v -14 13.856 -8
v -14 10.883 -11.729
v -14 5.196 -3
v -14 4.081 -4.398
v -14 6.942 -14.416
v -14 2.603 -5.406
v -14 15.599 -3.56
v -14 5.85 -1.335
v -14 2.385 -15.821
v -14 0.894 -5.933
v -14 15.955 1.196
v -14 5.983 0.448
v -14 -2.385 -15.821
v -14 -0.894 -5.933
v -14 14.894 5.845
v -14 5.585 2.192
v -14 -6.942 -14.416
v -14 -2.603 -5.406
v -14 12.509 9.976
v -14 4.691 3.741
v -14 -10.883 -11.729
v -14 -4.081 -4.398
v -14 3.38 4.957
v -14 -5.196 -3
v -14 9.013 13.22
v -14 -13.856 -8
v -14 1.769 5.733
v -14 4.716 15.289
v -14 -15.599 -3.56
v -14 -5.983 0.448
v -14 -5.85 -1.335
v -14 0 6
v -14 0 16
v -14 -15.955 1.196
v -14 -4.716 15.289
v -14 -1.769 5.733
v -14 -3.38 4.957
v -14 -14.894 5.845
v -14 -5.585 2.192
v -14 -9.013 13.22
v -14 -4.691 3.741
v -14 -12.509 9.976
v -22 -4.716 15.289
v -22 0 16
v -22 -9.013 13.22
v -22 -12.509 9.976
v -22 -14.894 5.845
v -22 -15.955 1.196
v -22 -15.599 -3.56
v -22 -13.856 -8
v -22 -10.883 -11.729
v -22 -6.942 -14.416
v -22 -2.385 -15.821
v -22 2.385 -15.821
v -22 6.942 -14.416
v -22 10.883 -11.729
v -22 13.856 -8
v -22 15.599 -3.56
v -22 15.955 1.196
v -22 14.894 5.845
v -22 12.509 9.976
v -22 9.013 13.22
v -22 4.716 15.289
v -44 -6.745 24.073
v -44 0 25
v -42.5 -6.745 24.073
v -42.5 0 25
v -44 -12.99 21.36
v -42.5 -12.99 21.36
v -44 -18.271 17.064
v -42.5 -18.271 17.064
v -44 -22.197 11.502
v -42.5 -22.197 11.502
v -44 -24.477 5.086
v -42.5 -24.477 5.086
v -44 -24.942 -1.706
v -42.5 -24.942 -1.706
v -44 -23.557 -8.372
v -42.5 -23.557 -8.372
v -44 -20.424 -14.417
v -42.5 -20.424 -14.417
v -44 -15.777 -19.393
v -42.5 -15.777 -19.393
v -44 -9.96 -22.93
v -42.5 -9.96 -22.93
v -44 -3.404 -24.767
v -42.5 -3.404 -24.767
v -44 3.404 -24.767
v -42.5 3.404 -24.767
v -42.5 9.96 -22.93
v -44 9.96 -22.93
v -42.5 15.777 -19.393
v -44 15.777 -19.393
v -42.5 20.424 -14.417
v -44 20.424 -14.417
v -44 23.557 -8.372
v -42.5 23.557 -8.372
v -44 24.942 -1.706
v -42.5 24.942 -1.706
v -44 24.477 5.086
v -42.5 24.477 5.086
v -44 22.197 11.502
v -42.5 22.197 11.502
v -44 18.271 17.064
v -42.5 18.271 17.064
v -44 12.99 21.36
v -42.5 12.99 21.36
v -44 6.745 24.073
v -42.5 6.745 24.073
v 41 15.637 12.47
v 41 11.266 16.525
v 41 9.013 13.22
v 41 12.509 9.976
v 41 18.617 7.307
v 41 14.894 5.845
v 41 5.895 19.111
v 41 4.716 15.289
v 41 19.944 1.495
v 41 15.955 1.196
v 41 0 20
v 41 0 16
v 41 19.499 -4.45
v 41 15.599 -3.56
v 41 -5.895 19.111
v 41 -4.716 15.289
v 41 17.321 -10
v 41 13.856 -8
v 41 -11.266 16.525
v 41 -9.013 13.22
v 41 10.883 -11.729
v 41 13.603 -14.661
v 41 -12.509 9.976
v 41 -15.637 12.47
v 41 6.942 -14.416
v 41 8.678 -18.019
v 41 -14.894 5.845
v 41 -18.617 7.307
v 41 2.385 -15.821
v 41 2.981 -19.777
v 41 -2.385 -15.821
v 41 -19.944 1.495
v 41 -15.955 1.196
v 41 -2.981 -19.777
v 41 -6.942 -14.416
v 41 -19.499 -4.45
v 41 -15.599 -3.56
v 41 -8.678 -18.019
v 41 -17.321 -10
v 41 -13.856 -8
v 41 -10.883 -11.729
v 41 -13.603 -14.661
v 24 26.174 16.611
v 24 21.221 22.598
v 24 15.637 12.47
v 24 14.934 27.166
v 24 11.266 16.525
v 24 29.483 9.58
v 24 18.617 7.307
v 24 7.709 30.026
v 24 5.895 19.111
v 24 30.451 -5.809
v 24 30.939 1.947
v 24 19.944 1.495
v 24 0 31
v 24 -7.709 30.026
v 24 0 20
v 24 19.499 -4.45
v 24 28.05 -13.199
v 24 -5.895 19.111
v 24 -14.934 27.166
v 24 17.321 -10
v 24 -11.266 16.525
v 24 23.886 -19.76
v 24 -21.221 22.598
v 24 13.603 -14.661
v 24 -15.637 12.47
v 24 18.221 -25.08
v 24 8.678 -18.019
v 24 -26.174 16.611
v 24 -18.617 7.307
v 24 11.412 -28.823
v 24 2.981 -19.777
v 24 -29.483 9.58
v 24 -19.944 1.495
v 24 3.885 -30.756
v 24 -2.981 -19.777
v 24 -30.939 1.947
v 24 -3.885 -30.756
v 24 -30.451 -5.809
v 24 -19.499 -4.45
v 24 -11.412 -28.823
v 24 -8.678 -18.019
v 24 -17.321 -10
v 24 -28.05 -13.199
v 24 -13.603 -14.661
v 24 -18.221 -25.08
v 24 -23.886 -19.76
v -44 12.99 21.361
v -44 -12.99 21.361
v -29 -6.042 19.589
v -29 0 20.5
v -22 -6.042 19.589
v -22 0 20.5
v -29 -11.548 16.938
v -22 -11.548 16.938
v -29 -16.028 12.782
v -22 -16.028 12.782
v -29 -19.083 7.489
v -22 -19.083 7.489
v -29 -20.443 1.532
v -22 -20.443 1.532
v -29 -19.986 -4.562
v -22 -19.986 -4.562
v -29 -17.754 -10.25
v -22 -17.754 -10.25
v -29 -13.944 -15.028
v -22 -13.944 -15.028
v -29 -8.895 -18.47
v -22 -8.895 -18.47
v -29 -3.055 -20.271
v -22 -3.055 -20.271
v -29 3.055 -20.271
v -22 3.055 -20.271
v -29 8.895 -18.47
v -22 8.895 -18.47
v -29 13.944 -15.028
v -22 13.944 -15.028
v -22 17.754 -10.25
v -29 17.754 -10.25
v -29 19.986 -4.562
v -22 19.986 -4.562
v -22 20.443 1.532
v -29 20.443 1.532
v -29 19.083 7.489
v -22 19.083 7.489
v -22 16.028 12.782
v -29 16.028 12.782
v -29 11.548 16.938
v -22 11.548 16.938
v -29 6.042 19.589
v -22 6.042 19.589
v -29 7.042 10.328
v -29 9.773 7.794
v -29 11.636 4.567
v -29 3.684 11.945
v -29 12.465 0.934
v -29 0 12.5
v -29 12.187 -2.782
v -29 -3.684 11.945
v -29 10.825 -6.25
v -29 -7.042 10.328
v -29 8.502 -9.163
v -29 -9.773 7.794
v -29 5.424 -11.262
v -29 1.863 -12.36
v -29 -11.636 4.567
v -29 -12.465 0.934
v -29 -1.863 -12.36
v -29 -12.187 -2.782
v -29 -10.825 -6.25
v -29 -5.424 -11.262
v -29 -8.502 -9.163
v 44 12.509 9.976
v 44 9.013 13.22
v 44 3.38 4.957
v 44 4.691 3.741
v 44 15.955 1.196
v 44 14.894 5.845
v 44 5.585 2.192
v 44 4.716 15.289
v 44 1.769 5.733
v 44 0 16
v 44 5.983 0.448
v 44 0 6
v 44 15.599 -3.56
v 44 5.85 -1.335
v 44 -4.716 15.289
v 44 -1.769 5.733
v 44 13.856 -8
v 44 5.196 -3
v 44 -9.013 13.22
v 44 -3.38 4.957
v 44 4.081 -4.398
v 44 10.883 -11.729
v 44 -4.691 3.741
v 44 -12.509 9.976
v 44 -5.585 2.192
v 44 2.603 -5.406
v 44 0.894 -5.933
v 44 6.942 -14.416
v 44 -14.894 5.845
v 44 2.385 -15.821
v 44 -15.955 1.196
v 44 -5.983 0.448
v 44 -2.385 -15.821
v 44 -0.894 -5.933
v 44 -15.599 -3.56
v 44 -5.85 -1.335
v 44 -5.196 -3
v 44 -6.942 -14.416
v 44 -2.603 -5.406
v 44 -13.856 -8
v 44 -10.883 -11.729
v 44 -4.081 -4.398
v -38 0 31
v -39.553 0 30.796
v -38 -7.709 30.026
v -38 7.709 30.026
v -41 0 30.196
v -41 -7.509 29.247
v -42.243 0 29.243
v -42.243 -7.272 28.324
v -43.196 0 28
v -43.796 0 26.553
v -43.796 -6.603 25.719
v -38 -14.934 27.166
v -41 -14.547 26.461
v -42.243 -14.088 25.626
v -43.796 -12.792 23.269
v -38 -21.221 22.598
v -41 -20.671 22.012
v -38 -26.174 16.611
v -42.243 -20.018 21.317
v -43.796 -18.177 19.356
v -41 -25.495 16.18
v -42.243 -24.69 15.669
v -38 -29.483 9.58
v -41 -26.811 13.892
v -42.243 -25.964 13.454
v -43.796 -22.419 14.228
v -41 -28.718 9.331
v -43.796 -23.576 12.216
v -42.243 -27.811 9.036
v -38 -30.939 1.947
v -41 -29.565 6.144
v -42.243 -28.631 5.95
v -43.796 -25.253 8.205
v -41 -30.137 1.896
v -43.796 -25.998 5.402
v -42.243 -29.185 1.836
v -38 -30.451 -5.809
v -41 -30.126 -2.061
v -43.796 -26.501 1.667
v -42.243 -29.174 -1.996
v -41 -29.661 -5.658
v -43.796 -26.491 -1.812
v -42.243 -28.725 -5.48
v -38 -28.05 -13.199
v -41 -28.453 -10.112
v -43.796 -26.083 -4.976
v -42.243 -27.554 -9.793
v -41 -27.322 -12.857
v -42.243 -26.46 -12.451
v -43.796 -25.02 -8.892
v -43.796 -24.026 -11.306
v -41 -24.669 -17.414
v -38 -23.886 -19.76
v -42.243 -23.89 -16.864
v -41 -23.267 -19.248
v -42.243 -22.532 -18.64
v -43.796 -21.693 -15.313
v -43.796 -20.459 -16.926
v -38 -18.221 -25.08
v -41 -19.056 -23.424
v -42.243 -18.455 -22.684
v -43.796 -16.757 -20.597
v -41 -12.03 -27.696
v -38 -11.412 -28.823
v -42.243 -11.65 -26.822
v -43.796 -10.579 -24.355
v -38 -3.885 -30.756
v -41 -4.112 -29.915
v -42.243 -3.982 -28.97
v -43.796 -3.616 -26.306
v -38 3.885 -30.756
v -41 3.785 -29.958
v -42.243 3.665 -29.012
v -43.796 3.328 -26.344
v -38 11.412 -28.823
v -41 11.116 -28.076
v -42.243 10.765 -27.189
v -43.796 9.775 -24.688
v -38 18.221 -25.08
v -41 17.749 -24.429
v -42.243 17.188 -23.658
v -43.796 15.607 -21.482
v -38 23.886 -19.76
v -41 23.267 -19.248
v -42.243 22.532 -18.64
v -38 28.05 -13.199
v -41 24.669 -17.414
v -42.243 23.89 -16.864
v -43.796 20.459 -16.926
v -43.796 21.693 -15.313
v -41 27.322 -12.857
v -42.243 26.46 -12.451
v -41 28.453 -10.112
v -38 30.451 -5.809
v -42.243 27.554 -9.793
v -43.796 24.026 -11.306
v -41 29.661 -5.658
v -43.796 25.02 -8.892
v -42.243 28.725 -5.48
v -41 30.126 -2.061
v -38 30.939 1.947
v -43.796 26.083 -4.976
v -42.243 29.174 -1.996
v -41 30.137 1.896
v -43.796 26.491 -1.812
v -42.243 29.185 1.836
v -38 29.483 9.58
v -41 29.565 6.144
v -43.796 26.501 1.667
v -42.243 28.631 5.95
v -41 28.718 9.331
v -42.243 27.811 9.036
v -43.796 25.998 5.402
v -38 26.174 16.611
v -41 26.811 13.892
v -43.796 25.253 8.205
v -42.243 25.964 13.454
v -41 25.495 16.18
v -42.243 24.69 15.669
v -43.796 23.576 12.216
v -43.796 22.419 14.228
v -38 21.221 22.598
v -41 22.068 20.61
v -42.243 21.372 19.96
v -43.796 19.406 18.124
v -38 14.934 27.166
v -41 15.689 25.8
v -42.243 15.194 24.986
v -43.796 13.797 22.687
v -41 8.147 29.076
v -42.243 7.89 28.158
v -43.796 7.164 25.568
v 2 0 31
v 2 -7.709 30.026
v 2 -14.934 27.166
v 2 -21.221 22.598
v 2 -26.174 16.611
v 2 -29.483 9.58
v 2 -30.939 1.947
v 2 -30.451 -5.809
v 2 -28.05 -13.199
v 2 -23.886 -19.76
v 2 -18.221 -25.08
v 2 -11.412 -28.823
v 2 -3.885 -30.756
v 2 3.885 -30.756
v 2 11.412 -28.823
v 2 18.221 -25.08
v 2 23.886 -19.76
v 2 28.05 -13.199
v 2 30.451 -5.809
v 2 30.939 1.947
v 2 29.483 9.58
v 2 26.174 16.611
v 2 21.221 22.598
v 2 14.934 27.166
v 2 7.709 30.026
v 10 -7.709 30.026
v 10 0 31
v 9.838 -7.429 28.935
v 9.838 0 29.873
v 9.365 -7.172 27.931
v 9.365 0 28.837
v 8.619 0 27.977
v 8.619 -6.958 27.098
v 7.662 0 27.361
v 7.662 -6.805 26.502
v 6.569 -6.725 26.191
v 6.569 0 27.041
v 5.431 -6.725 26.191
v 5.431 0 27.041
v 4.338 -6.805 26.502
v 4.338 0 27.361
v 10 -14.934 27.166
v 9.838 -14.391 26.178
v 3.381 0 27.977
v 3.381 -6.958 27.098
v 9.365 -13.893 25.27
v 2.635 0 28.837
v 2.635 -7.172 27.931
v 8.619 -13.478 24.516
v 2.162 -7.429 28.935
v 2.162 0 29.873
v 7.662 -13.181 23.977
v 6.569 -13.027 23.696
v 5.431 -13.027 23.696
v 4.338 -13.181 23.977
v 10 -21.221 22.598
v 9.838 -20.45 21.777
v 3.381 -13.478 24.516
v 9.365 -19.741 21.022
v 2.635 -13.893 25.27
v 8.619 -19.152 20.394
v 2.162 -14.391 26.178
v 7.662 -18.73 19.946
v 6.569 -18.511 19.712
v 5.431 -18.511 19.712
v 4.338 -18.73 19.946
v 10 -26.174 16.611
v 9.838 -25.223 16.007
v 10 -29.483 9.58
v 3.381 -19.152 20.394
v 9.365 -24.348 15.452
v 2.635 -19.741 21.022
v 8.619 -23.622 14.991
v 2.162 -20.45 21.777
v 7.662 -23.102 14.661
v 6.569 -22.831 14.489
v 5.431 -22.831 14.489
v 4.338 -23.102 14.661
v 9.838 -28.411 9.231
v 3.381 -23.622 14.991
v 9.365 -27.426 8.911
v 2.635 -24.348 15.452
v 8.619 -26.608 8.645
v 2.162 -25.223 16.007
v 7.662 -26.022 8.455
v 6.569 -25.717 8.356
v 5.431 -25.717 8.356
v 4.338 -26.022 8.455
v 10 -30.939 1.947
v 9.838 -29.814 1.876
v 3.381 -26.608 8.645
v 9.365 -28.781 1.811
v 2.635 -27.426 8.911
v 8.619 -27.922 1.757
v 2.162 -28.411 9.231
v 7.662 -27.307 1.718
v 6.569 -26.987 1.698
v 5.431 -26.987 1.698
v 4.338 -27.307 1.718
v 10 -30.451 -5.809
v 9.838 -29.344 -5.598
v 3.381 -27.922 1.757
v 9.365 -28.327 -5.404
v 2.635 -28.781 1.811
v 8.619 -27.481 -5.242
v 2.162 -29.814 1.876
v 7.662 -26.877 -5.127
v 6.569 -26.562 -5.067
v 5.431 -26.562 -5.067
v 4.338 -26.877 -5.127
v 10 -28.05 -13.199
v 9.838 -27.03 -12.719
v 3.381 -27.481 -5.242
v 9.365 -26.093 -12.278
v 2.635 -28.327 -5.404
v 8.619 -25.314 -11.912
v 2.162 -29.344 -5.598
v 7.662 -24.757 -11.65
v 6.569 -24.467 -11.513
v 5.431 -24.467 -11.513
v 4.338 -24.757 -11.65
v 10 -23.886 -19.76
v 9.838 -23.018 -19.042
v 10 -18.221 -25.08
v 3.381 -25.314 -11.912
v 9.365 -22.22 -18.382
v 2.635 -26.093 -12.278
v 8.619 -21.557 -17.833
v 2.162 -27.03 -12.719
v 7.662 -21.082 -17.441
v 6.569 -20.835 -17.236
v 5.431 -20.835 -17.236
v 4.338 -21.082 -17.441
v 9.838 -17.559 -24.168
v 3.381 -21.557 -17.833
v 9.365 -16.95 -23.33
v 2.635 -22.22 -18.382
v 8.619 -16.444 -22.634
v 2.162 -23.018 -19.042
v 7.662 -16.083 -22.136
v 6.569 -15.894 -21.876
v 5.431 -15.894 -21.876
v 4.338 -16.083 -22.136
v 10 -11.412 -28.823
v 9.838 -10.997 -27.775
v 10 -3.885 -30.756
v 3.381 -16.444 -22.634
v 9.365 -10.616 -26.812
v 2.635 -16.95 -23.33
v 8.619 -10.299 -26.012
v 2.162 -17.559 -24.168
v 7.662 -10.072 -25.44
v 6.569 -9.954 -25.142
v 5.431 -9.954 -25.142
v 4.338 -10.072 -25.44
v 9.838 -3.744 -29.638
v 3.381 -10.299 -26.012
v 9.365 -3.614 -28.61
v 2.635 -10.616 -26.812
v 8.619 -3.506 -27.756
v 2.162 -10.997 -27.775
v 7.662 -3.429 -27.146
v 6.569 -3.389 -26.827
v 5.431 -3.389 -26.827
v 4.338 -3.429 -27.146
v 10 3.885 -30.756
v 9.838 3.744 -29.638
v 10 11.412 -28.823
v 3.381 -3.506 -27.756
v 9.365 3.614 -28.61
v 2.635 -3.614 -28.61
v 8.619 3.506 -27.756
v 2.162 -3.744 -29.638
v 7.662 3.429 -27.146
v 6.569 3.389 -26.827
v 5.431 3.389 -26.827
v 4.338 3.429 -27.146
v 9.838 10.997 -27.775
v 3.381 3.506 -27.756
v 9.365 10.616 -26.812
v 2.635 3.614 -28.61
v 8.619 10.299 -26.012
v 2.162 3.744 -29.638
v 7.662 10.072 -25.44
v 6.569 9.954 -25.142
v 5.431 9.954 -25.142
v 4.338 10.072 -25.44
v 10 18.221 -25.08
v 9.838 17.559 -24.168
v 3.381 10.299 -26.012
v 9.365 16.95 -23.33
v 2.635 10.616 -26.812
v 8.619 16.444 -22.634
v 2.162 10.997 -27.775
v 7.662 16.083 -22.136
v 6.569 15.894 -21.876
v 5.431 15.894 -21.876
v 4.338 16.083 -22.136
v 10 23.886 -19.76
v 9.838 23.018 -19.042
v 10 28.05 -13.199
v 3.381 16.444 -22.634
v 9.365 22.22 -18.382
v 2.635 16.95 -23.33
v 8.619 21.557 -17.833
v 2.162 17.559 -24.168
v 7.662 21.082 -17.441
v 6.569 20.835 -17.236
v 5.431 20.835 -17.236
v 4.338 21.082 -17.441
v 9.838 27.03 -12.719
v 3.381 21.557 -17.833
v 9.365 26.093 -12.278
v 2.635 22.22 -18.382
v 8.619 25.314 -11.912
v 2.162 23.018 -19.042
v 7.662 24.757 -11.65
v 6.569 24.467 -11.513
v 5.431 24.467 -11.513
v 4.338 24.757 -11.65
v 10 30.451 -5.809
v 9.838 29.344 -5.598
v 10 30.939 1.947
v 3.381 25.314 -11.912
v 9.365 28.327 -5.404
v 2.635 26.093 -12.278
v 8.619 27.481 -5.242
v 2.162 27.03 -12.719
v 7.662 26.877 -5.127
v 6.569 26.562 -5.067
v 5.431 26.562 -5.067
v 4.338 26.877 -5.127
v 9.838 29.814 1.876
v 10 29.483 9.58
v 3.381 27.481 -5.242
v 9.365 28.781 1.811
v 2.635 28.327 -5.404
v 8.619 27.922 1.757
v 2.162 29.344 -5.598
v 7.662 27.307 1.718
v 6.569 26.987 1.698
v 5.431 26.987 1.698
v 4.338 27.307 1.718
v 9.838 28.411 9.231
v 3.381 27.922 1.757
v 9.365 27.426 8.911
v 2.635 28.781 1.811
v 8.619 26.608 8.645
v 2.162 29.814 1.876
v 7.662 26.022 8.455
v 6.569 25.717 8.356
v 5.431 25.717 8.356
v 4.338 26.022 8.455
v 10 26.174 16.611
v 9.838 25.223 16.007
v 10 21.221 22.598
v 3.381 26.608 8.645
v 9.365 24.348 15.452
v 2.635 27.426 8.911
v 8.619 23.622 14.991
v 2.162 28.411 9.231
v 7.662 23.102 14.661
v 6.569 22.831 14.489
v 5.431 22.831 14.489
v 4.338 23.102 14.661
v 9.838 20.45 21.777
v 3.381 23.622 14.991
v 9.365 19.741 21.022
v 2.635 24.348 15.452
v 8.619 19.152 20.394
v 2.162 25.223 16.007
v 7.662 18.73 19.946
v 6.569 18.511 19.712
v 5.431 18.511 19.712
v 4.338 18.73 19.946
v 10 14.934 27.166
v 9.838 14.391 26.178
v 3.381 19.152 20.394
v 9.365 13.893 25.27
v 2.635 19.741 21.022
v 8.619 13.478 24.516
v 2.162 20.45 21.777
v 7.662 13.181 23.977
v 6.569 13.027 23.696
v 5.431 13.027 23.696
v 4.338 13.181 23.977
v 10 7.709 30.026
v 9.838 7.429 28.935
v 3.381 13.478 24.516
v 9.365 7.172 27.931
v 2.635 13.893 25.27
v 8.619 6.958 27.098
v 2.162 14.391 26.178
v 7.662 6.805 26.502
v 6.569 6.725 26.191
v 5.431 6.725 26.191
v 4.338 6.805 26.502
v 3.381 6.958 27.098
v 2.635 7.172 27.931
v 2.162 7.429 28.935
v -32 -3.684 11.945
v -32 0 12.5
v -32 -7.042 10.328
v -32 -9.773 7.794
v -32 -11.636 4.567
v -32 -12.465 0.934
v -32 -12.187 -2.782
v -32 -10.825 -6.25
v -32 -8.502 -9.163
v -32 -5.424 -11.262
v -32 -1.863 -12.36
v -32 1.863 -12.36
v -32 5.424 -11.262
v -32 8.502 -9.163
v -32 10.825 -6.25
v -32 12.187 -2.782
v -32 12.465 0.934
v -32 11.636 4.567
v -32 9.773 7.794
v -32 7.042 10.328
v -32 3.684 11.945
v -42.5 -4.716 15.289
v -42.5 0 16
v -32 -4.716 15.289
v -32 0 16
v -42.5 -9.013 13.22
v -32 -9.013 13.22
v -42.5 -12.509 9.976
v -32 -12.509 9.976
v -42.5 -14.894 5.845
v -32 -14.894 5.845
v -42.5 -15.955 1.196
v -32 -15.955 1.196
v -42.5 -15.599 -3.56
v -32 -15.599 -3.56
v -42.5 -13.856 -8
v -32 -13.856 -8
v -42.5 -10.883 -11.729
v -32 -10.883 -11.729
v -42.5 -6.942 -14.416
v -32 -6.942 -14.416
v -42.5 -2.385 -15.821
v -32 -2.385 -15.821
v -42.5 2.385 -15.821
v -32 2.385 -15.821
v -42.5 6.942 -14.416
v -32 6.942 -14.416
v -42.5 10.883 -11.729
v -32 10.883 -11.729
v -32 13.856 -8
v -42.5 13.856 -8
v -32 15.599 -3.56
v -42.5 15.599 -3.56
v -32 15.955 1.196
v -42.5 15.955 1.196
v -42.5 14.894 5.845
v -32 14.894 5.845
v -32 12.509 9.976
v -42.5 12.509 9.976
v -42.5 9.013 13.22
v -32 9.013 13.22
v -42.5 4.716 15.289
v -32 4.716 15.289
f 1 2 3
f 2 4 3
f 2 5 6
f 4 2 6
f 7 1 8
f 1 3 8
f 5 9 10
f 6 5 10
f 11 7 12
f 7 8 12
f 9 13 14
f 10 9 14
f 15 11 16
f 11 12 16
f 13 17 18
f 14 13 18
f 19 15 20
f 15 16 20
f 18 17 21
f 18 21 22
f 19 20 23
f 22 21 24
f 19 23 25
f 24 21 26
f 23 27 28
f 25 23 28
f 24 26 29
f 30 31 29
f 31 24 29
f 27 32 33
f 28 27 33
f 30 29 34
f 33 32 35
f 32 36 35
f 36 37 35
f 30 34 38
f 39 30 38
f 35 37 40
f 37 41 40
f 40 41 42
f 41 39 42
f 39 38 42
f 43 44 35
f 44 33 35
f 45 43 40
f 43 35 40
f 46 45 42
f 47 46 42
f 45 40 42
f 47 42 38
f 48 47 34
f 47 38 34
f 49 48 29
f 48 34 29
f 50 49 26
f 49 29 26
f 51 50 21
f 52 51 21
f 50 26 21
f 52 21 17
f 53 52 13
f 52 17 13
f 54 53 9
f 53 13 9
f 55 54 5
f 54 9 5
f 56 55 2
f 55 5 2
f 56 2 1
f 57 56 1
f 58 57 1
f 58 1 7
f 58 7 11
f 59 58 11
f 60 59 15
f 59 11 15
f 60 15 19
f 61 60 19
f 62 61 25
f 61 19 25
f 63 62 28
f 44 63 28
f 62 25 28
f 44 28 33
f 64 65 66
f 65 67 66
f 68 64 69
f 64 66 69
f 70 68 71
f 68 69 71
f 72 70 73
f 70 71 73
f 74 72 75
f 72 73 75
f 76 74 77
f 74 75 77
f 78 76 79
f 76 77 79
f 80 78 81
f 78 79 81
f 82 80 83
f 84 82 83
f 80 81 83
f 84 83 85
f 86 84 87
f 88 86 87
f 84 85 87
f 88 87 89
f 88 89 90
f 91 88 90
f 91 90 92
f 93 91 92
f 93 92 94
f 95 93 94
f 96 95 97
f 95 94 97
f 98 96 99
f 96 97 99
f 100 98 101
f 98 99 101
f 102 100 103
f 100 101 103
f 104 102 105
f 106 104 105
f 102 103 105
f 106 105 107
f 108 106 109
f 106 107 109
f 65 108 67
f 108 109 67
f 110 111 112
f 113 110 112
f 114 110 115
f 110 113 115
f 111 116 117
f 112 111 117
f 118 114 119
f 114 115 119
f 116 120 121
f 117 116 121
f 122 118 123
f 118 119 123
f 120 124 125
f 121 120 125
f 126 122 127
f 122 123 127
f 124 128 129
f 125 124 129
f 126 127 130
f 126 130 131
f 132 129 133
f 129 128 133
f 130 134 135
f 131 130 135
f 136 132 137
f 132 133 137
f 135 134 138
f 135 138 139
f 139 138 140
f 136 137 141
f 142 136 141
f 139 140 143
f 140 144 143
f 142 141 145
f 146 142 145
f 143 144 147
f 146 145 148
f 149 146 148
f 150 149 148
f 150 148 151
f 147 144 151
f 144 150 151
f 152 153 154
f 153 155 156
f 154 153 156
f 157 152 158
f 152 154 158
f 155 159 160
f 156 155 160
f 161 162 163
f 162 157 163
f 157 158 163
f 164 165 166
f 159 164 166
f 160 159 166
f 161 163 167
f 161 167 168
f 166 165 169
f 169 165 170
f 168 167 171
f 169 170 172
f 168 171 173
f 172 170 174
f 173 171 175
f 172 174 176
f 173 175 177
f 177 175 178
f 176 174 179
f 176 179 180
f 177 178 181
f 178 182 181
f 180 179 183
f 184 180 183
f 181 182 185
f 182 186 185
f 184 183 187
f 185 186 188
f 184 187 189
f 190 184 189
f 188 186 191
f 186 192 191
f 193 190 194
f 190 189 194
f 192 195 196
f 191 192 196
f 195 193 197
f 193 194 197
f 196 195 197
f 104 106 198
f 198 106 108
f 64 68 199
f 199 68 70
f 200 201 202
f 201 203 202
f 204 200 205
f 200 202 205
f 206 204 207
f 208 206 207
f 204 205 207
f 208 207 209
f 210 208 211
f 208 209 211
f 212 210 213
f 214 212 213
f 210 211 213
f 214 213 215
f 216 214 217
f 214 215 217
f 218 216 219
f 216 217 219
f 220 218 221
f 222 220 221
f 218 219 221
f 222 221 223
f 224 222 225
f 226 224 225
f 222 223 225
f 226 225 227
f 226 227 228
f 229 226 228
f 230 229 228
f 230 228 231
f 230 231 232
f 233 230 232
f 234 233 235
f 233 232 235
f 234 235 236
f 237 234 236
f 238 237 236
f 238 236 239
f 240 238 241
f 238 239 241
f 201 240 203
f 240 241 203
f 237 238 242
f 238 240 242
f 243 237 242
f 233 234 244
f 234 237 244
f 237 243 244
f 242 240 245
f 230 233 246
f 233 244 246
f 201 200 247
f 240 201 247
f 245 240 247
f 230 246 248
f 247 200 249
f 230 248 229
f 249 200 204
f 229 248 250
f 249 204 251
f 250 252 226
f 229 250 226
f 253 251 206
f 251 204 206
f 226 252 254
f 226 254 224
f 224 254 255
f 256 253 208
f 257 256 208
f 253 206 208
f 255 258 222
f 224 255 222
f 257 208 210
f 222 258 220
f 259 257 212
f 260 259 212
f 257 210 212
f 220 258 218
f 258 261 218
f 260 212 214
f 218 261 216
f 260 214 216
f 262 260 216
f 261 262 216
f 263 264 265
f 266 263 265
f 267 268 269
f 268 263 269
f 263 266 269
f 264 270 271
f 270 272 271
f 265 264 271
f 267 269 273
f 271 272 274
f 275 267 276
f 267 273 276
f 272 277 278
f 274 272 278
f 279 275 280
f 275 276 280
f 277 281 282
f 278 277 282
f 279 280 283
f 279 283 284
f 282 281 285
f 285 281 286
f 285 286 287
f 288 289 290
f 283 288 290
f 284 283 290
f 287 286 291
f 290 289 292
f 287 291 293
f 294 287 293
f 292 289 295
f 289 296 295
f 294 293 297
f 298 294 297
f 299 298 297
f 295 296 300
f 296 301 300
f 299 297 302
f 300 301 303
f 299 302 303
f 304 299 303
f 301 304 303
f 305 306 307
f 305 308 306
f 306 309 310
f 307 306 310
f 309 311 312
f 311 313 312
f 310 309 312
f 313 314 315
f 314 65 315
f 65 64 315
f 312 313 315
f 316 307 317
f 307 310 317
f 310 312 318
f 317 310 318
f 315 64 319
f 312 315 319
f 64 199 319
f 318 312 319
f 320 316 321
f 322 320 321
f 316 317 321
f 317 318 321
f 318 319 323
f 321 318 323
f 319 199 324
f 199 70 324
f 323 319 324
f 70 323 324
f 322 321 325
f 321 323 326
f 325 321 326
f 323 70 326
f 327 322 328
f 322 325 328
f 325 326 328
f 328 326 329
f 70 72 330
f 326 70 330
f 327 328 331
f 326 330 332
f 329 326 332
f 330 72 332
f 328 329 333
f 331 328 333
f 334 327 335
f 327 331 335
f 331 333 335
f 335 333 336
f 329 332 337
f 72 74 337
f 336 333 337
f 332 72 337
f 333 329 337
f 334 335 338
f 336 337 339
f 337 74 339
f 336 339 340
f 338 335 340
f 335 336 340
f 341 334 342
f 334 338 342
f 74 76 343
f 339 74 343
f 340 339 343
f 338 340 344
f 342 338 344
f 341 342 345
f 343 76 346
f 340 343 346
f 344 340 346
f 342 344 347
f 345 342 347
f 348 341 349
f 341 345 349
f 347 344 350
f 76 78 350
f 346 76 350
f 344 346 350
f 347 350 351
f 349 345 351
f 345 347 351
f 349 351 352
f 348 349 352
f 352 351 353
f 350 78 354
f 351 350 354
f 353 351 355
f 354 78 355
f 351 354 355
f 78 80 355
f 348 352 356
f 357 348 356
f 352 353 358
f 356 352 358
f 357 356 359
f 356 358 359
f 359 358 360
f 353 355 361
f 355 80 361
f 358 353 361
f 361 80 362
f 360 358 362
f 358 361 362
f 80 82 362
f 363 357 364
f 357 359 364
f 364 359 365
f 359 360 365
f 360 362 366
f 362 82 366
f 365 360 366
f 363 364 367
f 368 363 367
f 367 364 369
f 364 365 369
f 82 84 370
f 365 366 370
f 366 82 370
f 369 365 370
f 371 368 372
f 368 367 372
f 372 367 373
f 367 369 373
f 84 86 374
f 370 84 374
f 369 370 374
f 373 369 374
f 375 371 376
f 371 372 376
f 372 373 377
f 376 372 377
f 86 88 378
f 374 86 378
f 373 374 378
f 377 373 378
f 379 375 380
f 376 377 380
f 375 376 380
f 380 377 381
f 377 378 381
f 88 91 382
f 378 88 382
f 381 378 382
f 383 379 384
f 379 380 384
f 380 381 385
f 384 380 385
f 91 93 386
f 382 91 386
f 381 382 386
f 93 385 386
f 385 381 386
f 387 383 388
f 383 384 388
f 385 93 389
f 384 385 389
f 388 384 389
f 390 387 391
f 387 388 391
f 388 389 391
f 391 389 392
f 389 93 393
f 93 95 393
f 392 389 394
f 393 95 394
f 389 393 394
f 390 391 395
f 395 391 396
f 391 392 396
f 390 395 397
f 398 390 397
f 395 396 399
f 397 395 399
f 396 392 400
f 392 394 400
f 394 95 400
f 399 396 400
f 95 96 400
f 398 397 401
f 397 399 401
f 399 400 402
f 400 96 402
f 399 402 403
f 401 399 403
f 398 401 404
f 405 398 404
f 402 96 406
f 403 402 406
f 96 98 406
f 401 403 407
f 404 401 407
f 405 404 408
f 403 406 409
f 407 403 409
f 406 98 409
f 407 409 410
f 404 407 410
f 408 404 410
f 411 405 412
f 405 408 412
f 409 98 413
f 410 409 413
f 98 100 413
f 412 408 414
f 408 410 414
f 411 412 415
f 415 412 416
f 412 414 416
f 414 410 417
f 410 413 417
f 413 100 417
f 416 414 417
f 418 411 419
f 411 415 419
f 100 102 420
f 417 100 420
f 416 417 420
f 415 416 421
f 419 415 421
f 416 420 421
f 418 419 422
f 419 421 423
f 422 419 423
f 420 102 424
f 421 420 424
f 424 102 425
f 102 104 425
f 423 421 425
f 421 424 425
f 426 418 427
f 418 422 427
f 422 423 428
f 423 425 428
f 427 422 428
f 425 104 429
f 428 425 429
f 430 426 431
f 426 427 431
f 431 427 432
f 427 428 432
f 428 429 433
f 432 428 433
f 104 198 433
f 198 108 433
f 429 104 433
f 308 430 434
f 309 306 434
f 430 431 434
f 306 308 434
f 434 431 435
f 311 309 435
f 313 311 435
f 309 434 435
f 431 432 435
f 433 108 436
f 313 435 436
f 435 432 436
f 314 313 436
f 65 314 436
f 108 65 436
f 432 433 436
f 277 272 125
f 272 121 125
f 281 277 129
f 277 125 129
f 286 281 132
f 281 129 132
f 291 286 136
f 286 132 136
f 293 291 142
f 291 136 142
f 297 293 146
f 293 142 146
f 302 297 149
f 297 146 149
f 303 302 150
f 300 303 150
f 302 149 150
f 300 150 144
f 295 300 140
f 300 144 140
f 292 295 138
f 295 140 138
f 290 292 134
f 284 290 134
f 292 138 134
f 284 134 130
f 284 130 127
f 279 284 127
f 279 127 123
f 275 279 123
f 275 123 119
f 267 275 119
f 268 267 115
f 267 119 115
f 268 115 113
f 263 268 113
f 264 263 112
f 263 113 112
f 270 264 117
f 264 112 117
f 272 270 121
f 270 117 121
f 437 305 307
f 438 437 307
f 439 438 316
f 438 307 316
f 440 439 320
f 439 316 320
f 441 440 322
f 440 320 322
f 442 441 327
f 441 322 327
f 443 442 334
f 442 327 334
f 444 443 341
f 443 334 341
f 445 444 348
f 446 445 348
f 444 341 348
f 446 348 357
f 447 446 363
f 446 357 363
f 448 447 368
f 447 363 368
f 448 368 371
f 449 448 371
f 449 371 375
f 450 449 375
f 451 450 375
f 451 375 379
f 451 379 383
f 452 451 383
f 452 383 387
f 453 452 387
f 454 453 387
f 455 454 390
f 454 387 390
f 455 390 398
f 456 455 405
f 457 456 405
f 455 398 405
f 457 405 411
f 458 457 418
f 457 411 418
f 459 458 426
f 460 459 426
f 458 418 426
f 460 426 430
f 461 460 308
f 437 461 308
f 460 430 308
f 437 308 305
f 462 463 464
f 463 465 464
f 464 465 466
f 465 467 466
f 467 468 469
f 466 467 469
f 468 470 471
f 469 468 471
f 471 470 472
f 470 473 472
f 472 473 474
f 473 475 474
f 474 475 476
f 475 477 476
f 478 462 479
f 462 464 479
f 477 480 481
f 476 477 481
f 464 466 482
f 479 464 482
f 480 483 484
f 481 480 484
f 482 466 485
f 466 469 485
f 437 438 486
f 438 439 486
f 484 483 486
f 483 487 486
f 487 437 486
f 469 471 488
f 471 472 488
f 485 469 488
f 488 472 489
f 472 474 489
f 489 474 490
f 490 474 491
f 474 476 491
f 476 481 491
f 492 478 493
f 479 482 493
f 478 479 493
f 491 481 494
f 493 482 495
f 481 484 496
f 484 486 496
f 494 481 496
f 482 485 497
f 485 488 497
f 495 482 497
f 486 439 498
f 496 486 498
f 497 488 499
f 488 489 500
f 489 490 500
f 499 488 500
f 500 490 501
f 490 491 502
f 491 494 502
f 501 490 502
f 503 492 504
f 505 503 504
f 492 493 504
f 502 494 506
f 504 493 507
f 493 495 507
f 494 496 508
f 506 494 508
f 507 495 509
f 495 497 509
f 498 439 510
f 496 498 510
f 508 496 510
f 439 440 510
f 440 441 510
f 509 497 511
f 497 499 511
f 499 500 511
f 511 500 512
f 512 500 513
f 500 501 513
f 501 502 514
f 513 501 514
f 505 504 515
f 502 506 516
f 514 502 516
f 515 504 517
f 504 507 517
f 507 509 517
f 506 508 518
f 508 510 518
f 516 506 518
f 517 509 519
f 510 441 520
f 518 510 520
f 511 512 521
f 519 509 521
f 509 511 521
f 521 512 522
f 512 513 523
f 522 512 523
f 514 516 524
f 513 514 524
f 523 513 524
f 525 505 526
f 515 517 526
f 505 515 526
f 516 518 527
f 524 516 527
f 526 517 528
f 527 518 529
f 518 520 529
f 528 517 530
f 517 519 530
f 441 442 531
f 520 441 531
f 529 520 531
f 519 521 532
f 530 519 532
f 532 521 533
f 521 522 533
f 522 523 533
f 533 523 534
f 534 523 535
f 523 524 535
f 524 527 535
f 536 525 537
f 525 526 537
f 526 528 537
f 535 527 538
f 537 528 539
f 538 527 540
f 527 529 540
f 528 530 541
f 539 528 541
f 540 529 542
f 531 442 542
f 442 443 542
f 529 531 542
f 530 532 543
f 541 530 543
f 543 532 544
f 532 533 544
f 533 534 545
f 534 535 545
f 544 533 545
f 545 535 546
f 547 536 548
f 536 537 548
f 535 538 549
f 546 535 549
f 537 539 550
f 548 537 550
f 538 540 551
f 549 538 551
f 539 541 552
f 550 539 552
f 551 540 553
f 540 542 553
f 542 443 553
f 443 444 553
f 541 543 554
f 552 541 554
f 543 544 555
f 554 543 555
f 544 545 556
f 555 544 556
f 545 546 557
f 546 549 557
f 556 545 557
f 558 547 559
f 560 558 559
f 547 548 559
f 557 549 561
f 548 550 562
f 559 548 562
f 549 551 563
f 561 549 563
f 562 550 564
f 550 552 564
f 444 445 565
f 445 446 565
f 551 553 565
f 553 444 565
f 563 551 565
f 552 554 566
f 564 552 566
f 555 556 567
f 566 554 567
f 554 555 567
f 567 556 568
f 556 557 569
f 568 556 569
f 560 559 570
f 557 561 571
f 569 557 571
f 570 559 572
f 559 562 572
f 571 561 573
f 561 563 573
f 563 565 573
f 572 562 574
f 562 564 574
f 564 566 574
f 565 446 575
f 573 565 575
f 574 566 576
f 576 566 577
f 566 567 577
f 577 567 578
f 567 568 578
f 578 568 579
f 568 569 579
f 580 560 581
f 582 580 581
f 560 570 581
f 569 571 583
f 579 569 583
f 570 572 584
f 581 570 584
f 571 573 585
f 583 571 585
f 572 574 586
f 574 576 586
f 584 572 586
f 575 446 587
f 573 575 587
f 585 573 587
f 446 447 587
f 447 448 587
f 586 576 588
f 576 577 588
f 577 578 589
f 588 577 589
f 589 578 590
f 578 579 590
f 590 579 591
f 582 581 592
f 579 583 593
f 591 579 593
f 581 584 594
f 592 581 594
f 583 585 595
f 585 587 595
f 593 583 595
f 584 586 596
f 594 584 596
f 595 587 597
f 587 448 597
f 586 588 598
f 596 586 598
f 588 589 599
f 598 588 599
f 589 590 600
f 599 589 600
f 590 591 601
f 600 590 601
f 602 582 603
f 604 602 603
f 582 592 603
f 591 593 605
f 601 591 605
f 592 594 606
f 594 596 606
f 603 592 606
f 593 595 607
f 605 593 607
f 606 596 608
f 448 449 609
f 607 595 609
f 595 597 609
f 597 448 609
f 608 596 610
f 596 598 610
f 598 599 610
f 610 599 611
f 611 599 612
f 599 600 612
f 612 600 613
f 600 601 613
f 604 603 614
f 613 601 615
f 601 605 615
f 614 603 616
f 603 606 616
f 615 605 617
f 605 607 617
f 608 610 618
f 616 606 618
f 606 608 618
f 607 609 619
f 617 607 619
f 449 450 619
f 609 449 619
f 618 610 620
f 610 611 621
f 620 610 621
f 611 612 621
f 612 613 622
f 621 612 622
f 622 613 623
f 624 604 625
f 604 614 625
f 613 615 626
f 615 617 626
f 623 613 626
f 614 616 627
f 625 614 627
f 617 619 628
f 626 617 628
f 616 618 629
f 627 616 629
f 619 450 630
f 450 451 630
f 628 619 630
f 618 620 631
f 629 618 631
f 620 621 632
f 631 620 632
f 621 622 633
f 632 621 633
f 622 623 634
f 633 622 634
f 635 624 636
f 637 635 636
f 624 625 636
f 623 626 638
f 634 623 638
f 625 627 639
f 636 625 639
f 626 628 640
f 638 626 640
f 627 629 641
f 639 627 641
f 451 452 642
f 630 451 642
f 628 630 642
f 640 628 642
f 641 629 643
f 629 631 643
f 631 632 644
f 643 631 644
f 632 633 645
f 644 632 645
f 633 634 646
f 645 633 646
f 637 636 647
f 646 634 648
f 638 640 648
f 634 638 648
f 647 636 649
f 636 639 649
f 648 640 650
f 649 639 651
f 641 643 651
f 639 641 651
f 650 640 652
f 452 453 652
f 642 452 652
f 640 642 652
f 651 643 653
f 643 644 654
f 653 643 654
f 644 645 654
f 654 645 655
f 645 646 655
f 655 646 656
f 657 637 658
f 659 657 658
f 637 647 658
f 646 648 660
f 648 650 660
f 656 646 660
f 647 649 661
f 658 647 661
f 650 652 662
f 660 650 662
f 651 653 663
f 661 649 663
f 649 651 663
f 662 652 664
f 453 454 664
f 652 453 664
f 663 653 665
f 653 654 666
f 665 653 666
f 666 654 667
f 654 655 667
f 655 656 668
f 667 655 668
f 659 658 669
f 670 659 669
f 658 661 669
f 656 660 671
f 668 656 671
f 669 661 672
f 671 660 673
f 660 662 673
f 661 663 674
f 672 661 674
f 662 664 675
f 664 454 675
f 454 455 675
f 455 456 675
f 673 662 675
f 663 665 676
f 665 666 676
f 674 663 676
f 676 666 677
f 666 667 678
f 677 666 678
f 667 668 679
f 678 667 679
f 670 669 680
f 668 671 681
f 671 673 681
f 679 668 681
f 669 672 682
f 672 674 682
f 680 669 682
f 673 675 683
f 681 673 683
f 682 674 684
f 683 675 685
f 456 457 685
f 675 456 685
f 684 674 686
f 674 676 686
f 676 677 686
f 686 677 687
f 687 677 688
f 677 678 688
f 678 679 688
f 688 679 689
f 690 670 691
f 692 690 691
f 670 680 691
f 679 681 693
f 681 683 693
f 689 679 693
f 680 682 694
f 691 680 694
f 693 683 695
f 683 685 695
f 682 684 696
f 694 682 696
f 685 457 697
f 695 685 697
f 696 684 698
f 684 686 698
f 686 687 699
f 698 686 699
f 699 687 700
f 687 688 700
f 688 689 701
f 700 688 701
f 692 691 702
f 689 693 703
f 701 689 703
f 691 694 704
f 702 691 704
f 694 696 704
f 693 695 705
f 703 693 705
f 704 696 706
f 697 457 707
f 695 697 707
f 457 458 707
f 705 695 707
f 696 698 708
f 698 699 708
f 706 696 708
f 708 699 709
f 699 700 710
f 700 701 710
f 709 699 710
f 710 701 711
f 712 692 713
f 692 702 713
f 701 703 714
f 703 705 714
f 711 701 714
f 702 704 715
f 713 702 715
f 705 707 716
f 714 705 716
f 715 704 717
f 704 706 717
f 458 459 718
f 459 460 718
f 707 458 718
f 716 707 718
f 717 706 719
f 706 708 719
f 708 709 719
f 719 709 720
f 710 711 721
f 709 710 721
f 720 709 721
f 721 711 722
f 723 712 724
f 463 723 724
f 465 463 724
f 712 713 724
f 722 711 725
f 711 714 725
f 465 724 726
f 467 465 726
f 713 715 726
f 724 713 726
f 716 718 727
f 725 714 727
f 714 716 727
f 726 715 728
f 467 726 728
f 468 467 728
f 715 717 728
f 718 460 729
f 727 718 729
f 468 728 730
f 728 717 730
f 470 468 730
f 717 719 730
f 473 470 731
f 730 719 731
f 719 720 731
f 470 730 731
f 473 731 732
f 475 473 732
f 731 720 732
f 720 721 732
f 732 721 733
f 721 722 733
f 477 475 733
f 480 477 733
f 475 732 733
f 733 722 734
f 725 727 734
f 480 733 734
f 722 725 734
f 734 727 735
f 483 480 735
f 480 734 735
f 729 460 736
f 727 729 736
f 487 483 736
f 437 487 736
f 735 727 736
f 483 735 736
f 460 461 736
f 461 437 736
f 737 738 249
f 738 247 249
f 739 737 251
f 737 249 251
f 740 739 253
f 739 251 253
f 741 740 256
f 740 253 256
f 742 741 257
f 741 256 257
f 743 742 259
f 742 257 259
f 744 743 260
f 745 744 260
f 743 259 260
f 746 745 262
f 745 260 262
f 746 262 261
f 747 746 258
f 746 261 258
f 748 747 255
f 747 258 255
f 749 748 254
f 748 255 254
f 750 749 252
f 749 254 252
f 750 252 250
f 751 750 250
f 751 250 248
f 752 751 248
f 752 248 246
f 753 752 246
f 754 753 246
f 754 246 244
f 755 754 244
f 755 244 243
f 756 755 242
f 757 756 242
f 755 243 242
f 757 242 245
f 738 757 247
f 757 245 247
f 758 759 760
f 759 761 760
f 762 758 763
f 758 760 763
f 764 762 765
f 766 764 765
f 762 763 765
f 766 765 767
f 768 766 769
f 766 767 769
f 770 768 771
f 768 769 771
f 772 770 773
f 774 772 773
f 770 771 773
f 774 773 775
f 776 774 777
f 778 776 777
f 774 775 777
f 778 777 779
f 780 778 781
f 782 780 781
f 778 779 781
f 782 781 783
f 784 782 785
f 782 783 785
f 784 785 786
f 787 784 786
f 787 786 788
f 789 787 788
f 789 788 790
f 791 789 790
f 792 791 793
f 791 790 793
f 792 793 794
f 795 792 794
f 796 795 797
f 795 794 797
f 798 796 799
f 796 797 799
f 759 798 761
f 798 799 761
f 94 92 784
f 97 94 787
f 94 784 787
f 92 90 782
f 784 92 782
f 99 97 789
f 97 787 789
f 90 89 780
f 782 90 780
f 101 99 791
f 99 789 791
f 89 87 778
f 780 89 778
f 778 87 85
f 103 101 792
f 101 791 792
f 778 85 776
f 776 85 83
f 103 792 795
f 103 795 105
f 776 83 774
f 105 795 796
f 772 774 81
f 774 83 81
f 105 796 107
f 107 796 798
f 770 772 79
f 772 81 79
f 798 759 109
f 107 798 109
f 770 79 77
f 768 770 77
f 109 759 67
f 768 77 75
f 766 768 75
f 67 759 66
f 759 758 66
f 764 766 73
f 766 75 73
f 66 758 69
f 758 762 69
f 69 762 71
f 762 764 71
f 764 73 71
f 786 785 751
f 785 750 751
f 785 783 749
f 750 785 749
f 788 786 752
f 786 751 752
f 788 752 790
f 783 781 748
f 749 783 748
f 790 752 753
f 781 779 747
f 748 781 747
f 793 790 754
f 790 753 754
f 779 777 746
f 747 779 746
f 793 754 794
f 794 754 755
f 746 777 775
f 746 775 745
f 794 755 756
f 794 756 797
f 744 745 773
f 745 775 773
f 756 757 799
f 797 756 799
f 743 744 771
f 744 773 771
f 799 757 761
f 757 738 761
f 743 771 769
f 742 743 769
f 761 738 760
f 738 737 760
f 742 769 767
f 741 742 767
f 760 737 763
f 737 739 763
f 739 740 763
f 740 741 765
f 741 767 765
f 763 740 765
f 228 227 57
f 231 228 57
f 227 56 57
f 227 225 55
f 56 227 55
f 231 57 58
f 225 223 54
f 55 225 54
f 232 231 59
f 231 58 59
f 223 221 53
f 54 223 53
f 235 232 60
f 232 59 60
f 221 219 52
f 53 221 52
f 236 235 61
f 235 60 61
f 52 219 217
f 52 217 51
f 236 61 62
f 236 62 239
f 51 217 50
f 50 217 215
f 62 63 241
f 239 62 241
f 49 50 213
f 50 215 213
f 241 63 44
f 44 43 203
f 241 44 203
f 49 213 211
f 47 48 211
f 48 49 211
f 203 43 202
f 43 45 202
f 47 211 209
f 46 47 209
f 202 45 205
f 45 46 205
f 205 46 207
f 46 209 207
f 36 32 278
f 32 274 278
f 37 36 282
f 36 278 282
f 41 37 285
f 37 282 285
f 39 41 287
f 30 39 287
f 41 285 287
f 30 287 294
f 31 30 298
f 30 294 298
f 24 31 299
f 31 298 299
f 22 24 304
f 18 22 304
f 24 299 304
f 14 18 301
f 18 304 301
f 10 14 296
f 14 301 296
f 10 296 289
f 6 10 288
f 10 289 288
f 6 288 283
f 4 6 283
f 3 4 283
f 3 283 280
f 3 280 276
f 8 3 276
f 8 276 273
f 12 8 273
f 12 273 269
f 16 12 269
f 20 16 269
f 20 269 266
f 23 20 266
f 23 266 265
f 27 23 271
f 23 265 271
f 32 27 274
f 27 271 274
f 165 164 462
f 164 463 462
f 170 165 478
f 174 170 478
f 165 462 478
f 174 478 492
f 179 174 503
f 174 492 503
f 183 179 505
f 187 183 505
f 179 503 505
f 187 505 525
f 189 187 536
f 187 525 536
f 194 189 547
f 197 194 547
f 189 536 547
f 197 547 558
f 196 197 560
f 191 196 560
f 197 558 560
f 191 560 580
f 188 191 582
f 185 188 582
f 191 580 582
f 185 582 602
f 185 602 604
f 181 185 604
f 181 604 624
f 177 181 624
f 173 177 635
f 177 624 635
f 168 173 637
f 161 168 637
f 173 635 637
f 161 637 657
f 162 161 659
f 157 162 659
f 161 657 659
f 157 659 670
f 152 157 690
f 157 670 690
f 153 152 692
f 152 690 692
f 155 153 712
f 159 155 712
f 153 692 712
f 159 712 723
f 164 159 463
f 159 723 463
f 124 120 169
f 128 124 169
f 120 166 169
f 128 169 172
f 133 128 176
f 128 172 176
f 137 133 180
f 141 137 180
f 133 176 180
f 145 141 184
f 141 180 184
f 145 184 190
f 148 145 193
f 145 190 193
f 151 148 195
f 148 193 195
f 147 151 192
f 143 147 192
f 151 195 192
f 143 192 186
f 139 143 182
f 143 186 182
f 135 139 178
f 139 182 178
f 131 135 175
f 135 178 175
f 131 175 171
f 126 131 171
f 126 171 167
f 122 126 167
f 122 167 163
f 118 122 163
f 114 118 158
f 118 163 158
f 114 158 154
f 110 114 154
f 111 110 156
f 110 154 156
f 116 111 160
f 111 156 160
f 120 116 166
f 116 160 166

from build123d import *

# Parameters (mm, degrees)
FILLET3_R = 6


with BuildPart() as part:
    # Sketch1 → Revolve1 (revolve)
    with BuildSketch(Plane.XY, mode=Mode.PRIVATE) as revolve1_sk:
        with BuildLine():
            Line((44, 6), (44, 16))
            Line((44, 16), (41, 16))
            Line((41, 16), (41, 20))
            Line((41, 20), (24, 20))
            Line((24, 20), (24, 31))
            Line((24, 31), (10, 31))
            ThreePointArc((10, 31), (6, 27), (2, 31))
            Line((2, 31), (-44, 31))
            Line((-44, 31), (-44, 25))
            Line((-44, 25), (-42.5, 25))
            Line((-42.5, 25), (-42.5, 16))
            Line((-42.5, 16), (-32, 16))
            Line((-32, 16), (-32, 12.5))
            Line((-32, 12.5), (-29, 12.5))
            Line((-29, 12.5), (-29, 20.5))
            Line((-29, 20.5), (-22, 20.5))
            Line((-22, 20.5), (-22, 16))
            Line((-22, 16), (-14, 16))
            Line((-14, 16), (-14, 6))
            Line((-14, 6), (44, 6))
        make_face()
    revolve(revolve1_sk.sketch.rotate(Axis((-44, 0, 0), (1, 0, 0)), 90), axis=Axis((-44, 0, 0), (1, 0, 0)))

    # Fillet3
    fillet3_edges = [part.edges().sort_by_distance(p)[0] for p in [
        (-44, 0, -31),
    ]]
    fillet(fillet3_edges, radius=FILLET3_R - 0.0001)  # a hair under: the kernel refuses the full size


solid = part.part
